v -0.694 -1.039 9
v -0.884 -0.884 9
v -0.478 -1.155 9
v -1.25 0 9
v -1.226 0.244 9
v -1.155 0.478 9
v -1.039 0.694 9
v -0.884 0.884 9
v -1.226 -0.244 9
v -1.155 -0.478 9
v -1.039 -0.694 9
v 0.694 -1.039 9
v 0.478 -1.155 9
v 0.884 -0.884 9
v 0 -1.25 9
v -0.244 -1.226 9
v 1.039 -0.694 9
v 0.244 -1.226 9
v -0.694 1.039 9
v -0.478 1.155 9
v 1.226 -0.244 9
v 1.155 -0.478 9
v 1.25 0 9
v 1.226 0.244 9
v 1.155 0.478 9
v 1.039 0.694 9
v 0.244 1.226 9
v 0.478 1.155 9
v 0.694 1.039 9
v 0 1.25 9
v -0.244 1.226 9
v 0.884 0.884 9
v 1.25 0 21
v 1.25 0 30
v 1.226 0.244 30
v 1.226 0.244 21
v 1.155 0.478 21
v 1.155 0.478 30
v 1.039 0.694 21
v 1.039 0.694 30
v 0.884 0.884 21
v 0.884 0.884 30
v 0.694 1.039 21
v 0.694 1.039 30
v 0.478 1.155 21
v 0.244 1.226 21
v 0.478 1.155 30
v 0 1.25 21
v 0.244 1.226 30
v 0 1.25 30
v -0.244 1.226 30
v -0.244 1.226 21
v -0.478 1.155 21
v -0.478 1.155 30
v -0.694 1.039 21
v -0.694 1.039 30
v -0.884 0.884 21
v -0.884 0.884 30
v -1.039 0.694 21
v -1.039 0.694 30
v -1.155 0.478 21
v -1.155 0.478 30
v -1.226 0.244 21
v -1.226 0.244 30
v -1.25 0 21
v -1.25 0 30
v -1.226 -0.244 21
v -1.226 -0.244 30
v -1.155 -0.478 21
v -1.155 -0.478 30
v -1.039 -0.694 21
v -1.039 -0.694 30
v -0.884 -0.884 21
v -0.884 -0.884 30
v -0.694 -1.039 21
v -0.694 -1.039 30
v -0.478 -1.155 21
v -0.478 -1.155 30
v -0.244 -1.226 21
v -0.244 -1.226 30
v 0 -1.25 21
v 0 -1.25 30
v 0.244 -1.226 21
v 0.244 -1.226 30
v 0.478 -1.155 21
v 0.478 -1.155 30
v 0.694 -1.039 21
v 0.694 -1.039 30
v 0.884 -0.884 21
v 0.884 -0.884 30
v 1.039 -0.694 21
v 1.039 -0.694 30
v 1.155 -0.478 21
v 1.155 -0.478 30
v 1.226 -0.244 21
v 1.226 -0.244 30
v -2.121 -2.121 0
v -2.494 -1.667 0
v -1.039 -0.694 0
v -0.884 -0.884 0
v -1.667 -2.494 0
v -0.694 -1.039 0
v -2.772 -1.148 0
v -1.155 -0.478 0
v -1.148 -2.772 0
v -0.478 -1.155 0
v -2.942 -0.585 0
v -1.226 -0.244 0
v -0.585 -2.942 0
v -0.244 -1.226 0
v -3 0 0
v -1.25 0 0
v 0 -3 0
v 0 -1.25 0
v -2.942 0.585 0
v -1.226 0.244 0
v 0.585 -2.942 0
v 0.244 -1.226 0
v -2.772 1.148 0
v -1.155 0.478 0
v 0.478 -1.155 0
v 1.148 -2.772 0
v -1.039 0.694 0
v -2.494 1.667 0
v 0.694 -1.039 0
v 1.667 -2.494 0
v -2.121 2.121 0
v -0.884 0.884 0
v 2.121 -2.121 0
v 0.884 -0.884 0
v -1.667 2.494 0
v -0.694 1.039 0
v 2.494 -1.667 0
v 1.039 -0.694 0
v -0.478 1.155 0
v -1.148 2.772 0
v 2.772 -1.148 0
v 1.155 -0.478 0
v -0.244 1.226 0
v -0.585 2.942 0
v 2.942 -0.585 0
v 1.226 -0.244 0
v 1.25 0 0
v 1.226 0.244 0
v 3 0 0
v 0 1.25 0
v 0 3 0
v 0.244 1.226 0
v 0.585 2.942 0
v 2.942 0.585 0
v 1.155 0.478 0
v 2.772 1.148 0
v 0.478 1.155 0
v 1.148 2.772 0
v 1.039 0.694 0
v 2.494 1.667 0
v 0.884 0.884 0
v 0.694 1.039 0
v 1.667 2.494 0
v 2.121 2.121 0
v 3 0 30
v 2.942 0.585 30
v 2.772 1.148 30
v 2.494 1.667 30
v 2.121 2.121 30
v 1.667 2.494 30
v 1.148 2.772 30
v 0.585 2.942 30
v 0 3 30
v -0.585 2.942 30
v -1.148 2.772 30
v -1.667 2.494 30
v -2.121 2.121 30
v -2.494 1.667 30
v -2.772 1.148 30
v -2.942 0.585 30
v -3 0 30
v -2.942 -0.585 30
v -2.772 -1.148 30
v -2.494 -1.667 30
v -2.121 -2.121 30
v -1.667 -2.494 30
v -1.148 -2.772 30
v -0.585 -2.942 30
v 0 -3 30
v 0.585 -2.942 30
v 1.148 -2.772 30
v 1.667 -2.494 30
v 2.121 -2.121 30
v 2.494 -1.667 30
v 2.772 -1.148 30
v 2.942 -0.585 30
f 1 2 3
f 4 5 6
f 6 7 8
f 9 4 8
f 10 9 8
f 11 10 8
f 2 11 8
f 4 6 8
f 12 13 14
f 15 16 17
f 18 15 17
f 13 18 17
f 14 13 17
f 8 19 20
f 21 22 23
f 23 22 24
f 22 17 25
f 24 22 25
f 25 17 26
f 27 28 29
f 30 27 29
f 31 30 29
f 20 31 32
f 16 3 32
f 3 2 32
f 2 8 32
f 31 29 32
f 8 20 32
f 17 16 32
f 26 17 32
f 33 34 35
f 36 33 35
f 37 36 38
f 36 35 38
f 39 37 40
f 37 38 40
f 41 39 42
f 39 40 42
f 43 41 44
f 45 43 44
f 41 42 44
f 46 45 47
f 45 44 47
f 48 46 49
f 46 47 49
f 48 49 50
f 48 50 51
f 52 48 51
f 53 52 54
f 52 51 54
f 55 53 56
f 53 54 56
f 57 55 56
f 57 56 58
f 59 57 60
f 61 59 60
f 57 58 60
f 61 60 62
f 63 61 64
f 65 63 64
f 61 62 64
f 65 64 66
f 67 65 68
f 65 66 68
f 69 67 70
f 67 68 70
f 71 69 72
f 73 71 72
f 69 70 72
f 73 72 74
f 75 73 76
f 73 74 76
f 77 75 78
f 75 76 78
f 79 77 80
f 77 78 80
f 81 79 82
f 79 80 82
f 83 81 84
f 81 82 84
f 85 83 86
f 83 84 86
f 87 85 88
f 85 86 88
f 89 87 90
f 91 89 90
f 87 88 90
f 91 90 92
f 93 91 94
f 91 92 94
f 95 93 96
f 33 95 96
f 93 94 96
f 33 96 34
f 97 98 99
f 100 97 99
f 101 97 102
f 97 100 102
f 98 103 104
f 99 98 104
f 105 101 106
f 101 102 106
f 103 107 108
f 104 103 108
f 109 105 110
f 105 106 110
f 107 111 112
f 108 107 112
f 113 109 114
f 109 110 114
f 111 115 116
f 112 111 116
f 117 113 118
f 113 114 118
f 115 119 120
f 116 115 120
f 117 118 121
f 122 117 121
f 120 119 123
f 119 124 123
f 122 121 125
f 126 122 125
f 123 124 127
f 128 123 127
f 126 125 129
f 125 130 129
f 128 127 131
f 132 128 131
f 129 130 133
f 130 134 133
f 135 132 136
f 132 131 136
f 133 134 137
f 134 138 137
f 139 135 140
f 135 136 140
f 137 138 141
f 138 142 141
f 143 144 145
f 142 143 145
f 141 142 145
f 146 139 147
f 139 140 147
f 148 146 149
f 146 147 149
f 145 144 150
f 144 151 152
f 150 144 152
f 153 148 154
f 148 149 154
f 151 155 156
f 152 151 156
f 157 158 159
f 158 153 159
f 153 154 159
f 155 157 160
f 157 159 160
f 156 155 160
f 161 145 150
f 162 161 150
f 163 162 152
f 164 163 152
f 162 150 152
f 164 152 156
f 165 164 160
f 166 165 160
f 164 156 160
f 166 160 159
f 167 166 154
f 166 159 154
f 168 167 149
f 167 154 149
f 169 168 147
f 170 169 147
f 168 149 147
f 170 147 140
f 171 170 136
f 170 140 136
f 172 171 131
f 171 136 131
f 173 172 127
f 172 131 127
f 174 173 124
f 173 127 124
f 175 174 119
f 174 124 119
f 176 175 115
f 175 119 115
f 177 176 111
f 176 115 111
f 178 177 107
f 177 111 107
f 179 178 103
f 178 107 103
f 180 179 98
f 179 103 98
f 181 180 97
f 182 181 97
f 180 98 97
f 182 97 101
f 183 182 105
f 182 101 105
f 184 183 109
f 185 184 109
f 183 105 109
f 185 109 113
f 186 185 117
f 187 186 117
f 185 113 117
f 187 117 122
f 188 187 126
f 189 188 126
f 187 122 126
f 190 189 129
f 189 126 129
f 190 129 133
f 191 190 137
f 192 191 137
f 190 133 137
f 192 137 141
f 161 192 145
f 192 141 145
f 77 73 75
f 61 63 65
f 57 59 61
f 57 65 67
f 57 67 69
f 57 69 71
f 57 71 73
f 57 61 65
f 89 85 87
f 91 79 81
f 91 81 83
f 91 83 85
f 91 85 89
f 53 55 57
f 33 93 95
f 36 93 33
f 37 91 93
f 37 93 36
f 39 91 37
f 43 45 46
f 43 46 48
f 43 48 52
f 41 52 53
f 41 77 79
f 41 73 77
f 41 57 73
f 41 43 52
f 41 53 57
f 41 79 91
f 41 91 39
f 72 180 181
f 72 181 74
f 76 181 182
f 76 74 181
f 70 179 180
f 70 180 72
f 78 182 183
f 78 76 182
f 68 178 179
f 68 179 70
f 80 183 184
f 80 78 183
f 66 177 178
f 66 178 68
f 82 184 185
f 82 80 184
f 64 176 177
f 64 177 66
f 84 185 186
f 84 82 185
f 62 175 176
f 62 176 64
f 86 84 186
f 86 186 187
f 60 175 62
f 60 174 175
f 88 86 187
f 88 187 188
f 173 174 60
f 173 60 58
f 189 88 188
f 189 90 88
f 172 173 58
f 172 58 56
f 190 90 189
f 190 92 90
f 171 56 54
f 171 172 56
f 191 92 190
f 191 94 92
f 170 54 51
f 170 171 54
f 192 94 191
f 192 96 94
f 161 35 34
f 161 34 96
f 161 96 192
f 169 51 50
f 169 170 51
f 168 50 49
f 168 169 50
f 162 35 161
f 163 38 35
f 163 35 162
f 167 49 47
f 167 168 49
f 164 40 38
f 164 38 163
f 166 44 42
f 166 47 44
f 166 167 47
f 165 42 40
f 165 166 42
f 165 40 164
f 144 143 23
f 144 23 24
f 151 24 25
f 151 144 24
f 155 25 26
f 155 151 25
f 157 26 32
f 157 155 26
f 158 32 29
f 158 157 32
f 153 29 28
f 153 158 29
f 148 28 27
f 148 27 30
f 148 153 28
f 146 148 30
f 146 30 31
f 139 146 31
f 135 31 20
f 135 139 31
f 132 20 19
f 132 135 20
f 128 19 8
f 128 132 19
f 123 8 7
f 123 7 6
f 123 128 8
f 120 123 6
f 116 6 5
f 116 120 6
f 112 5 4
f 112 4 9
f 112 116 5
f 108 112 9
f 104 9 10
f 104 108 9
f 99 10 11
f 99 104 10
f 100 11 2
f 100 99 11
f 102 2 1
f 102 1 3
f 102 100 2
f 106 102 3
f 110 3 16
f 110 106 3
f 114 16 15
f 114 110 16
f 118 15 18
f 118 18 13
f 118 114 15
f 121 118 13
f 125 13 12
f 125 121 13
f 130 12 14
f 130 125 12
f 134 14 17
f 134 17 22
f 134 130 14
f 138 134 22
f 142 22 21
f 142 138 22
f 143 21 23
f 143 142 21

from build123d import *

# Parameters (mm, degrees)
F0_R     = 3
F0_R_2   = 1.25
F1_DEPTH = 30
F2_DEPTH = 9
F3_R     = 1.25
F4_DEPTH = 9


with BuildPart() as f1:
    # F0 (on Top) → F1 (new body)
    with BuildSketch(Plane.XY):
        Circle(F0_R)
        Circle(F0_R_2, mode=Mode.SUBTRACT)
        Circle(F0_R_2)
    extrude(amount=F1_DEPTH)

    # F0 (on Top) → F2 (cut)
    with BuildSketch(Plane.XY):
        Circle(F0_R_2)
    extrude(amount=F2_DEPTH, mode=Mode.SUBTRACT)

    # F3 (on face) → F4 (cut)
    with BuildSketch(Plane.XY.offset(30)):
        Circle(F3_R)
    extrude(amount=-F4_DEPTH, mode=Mode.SUBTRACT)


solid = f1.part
